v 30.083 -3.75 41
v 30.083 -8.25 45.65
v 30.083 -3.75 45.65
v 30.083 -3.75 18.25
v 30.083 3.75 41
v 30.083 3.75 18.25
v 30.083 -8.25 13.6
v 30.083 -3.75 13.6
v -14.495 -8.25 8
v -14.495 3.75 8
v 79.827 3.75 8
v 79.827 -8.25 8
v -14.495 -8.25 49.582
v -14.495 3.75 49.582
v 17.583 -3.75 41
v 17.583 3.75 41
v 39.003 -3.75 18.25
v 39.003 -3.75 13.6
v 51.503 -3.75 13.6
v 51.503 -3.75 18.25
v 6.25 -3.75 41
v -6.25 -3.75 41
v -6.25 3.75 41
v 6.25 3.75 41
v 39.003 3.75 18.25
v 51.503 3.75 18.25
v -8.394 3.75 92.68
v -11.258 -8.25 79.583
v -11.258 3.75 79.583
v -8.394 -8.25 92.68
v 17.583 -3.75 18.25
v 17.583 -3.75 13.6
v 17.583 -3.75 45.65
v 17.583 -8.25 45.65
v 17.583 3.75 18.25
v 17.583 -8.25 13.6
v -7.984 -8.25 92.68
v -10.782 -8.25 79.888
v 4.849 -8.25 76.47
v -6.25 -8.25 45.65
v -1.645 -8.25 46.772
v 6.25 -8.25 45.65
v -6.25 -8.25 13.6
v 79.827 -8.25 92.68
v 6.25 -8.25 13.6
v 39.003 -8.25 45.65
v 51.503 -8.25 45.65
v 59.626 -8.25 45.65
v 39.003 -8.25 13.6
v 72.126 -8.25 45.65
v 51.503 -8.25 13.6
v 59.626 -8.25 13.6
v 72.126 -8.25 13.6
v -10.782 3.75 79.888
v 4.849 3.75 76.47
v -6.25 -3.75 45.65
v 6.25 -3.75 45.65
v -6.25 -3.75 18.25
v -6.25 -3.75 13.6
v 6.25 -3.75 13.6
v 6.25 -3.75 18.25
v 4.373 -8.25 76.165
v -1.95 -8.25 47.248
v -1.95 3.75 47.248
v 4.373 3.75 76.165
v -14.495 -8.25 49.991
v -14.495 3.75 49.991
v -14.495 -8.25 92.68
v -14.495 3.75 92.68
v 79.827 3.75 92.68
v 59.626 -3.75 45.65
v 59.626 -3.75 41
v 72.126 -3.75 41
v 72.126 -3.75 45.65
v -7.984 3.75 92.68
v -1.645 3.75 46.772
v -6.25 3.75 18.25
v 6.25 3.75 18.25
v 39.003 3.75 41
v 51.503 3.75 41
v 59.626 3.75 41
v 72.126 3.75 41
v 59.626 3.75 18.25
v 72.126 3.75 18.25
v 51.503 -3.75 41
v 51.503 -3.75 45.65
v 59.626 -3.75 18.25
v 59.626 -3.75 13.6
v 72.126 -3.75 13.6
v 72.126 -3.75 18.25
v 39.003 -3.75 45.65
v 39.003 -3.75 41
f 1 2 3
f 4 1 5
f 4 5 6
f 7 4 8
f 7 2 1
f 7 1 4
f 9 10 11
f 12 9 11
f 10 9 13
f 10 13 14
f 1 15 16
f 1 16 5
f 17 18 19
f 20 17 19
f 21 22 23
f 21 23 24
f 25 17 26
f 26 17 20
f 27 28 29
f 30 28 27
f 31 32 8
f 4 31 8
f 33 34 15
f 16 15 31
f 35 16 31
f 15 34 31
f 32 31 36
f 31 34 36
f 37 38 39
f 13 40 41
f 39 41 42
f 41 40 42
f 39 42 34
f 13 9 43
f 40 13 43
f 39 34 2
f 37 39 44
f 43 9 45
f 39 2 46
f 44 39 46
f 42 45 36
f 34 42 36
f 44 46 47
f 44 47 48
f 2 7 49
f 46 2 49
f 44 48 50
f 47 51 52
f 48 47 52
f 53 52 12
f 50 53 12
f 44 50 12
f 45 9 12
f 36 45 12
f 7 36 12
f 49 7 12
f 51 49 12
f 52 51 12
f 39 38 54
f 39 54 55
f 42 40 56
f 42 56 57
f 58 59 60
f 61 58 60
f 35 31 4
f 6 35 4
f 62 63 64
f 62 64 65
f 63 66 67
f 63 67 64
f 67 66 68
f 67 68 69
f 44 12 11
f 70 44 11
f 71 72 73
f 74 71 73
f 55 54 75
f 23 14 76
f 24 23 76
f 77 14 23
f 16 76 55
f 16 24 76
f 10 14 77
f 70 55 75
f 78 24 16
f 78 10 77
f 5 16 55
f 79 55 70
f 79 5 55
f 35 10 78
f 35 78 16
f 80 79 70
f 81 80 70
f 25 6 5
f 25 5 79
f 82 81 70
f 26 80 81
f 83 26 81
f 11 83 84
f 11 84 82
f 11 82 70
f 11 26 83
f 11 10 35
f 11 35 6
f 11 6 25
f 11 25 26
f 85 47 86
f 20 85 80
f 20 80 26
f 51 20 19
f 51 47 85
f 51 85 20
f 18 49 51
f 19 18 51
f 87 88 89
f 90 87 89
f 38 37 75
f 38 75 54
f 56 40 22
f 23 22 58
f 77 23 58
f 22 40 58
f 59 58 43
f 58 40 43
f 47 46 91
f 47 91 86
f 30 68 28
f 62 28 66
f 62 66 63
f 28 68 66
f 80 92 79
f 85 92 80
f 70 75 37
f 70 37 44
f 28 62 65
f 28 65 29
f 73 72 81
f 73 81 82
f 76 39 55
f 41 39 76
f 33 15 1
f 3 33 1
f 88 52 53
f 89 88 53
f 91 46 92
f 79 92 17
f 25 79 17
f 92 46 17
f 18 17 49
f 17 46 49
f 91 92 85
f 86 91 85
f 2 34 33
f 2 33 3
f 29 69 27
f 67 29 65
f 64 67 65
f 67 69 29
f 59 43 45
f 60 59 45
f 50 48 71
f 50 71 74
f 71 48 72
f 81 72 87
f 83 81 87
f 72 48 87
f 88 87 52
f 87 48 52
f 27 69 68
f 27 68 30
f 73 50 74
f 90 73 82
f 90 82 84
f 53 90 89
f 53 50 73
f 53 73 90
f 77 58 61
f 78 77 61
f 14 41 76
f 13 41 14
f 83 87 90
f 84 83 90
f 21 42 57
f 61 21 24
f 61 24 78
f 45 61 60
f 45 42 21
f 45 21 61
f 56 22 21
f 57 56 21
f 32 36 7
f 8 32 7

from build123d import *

# Parameters (mm, degrees)
BOSS_EXTRUDE1_START          = 8
SKETCH24_W                   = 94.322539244
SKETCH24_H                   = 12
BOSS_EXTRUDE1_DEPTH          = 84.68
CUT_EXTRUDE1_DEPTH           = 123.597068624
CUT_EXTRUDE1_DEPTH_BACK      = 123.597068624
SKETCH25_W                   = 12.5
SKETCH25_H                   = 22.75
CUT_EXTRUDE2_START           = -8.25
SKETCH25_5_W                 = 12.5
SKETCH25_5_H                 = 32.05
CUT_EXTRUDE2_DEPTH           = 4.5
CUT_EXTRUDE_THIN1_DEPTH      = 123.597068624
CUT_EXTRUDE_THIN1_DEPTH_BACK = 123.597068624


with BuildPart() as part:
    # Sketch24 → Boss-Extrude1 (new body)
    with BuildSketch(Plane.XY.offset(BOSS_EXTRUDE1_START)):
        with Locations((32.666021045, -2.25)):
            Rectangle(SKETCH24_W, SKETCH24_H)
    extrude(amount=BOSS_EXTRUDE1_DEPTH)

    # Sketch25 → Cut-Extrude1 (cut, two sides: drawn at the far end of the back side and taken through both)
    with BuildSketch(Plane(origin=(0, 0, 0), x_dir=(1, 0, 0), z_dir=(0, 1, 0)).offset(-CUT_EXTRUDE1_DEPTH_BACK)):
        with Locations((0, -29.625)):
            Rectangle(SKETCH25_W, SKETCH25_H)
        with Locations((23.832958, -29.625)):
            Rectangle(SKETCH25_W, SKETCH25_H)
        with Locations((45.252958, -29.625)):
            Rectangle(SKETCH25_W, SKETCH25_H)
        with Locations((65.876479, -29.625)):
            Rectangle(SKETCH25_W, SKETCH25_H)
    extrude(amount=CUT_EXTRUDE1_DEPTH + CUT_EXTRUDE1_DEPTH_BACK, mode=Mode.SUBTRACT)

    # Sketch25<5> → Cut-Extrude2 (cut)
    with BuildSketch(Plane(origin=(0, 0, 0), x_dir=(1, 0, 0), z_dir=(0, 1, 0)).offset(CUT_EXTRUDE2_START)):
        with Locations((0, -29.625)):
            Rectangle(SKETCH25_5_W, SKETCH25_5_H)
        with Locations((23.832958, -29.625)):
            Rectangle(SKETCH25_5_W, SKETCH25_5_H)
        with Locations((45.252958, -29.625)):
            Rectangle(SKETCH25_5_W, SKETCH25_5_H)
        with Locations((65.876479, -29.625)):
            Rectangle(SKETCH25_5_W, SKETCH25_5_H)
    extrude(amount=CUT_EXTRUDE2_DEPTH, mode=Mode.SUBTRACT)

    # Sketch30 → Cut-Extrude-Thin1 (cut, two sides: drawn at the far end of the back side and taken through both)
    with BuildSketch(Plane(origin=(0, 0, 0), x_dir=(1, 0, 0), z_dir=(0, 1, 0)).offset(-CUT_EXTRUDE_THIN1_DEPTH_BACK)):
        Polygon((-22.402588905, -28.615435543), (-17.58089022, -50.665808361), (-1.950220608, -47.247889774), (4.372928778, -76.164628557), (-11.257740834, -79.582547144), (-6.330432598, -102.115888754), (-5.939665858, -102.030440789), (-10.781526129, -79.88786592), (4.849143483, -76.469947333), (-1.644901832, -46.771675069), (-17.275571445, -50.189593656), (-22.011822165, -28.529987578), align=None)
    extrude(amount=CUT_EXTRUDE_THIN1_DEPTH + CUT_EXTRUDE_THIN1_DEPTH_BACK, mode=Mode.SUBTRACT)


with BuildPart() as cut_extrude_thin1_piece_1:
    # of the separate pieces the step leaves, piece 1, a body of its own (cut_extrude_thin1_pieces)
    add(part.part.solids().sort_by_distance((-14.495248577, 3.75, 8))[0])


with BuildPart() as cut_extrude_thin1_piece_2:
    # of the separate pieces the step leaves, piece 2, a body of its own (cut_extrude_thin1_pieces)
    add(part.part.solids().sort_by_distance((-1.950220608, 3.75, 47.247889774))[0])


solid = Compound([cut_extrude_thin1_piece_1.part, cut_extrude_thin1_piece_2.part])
